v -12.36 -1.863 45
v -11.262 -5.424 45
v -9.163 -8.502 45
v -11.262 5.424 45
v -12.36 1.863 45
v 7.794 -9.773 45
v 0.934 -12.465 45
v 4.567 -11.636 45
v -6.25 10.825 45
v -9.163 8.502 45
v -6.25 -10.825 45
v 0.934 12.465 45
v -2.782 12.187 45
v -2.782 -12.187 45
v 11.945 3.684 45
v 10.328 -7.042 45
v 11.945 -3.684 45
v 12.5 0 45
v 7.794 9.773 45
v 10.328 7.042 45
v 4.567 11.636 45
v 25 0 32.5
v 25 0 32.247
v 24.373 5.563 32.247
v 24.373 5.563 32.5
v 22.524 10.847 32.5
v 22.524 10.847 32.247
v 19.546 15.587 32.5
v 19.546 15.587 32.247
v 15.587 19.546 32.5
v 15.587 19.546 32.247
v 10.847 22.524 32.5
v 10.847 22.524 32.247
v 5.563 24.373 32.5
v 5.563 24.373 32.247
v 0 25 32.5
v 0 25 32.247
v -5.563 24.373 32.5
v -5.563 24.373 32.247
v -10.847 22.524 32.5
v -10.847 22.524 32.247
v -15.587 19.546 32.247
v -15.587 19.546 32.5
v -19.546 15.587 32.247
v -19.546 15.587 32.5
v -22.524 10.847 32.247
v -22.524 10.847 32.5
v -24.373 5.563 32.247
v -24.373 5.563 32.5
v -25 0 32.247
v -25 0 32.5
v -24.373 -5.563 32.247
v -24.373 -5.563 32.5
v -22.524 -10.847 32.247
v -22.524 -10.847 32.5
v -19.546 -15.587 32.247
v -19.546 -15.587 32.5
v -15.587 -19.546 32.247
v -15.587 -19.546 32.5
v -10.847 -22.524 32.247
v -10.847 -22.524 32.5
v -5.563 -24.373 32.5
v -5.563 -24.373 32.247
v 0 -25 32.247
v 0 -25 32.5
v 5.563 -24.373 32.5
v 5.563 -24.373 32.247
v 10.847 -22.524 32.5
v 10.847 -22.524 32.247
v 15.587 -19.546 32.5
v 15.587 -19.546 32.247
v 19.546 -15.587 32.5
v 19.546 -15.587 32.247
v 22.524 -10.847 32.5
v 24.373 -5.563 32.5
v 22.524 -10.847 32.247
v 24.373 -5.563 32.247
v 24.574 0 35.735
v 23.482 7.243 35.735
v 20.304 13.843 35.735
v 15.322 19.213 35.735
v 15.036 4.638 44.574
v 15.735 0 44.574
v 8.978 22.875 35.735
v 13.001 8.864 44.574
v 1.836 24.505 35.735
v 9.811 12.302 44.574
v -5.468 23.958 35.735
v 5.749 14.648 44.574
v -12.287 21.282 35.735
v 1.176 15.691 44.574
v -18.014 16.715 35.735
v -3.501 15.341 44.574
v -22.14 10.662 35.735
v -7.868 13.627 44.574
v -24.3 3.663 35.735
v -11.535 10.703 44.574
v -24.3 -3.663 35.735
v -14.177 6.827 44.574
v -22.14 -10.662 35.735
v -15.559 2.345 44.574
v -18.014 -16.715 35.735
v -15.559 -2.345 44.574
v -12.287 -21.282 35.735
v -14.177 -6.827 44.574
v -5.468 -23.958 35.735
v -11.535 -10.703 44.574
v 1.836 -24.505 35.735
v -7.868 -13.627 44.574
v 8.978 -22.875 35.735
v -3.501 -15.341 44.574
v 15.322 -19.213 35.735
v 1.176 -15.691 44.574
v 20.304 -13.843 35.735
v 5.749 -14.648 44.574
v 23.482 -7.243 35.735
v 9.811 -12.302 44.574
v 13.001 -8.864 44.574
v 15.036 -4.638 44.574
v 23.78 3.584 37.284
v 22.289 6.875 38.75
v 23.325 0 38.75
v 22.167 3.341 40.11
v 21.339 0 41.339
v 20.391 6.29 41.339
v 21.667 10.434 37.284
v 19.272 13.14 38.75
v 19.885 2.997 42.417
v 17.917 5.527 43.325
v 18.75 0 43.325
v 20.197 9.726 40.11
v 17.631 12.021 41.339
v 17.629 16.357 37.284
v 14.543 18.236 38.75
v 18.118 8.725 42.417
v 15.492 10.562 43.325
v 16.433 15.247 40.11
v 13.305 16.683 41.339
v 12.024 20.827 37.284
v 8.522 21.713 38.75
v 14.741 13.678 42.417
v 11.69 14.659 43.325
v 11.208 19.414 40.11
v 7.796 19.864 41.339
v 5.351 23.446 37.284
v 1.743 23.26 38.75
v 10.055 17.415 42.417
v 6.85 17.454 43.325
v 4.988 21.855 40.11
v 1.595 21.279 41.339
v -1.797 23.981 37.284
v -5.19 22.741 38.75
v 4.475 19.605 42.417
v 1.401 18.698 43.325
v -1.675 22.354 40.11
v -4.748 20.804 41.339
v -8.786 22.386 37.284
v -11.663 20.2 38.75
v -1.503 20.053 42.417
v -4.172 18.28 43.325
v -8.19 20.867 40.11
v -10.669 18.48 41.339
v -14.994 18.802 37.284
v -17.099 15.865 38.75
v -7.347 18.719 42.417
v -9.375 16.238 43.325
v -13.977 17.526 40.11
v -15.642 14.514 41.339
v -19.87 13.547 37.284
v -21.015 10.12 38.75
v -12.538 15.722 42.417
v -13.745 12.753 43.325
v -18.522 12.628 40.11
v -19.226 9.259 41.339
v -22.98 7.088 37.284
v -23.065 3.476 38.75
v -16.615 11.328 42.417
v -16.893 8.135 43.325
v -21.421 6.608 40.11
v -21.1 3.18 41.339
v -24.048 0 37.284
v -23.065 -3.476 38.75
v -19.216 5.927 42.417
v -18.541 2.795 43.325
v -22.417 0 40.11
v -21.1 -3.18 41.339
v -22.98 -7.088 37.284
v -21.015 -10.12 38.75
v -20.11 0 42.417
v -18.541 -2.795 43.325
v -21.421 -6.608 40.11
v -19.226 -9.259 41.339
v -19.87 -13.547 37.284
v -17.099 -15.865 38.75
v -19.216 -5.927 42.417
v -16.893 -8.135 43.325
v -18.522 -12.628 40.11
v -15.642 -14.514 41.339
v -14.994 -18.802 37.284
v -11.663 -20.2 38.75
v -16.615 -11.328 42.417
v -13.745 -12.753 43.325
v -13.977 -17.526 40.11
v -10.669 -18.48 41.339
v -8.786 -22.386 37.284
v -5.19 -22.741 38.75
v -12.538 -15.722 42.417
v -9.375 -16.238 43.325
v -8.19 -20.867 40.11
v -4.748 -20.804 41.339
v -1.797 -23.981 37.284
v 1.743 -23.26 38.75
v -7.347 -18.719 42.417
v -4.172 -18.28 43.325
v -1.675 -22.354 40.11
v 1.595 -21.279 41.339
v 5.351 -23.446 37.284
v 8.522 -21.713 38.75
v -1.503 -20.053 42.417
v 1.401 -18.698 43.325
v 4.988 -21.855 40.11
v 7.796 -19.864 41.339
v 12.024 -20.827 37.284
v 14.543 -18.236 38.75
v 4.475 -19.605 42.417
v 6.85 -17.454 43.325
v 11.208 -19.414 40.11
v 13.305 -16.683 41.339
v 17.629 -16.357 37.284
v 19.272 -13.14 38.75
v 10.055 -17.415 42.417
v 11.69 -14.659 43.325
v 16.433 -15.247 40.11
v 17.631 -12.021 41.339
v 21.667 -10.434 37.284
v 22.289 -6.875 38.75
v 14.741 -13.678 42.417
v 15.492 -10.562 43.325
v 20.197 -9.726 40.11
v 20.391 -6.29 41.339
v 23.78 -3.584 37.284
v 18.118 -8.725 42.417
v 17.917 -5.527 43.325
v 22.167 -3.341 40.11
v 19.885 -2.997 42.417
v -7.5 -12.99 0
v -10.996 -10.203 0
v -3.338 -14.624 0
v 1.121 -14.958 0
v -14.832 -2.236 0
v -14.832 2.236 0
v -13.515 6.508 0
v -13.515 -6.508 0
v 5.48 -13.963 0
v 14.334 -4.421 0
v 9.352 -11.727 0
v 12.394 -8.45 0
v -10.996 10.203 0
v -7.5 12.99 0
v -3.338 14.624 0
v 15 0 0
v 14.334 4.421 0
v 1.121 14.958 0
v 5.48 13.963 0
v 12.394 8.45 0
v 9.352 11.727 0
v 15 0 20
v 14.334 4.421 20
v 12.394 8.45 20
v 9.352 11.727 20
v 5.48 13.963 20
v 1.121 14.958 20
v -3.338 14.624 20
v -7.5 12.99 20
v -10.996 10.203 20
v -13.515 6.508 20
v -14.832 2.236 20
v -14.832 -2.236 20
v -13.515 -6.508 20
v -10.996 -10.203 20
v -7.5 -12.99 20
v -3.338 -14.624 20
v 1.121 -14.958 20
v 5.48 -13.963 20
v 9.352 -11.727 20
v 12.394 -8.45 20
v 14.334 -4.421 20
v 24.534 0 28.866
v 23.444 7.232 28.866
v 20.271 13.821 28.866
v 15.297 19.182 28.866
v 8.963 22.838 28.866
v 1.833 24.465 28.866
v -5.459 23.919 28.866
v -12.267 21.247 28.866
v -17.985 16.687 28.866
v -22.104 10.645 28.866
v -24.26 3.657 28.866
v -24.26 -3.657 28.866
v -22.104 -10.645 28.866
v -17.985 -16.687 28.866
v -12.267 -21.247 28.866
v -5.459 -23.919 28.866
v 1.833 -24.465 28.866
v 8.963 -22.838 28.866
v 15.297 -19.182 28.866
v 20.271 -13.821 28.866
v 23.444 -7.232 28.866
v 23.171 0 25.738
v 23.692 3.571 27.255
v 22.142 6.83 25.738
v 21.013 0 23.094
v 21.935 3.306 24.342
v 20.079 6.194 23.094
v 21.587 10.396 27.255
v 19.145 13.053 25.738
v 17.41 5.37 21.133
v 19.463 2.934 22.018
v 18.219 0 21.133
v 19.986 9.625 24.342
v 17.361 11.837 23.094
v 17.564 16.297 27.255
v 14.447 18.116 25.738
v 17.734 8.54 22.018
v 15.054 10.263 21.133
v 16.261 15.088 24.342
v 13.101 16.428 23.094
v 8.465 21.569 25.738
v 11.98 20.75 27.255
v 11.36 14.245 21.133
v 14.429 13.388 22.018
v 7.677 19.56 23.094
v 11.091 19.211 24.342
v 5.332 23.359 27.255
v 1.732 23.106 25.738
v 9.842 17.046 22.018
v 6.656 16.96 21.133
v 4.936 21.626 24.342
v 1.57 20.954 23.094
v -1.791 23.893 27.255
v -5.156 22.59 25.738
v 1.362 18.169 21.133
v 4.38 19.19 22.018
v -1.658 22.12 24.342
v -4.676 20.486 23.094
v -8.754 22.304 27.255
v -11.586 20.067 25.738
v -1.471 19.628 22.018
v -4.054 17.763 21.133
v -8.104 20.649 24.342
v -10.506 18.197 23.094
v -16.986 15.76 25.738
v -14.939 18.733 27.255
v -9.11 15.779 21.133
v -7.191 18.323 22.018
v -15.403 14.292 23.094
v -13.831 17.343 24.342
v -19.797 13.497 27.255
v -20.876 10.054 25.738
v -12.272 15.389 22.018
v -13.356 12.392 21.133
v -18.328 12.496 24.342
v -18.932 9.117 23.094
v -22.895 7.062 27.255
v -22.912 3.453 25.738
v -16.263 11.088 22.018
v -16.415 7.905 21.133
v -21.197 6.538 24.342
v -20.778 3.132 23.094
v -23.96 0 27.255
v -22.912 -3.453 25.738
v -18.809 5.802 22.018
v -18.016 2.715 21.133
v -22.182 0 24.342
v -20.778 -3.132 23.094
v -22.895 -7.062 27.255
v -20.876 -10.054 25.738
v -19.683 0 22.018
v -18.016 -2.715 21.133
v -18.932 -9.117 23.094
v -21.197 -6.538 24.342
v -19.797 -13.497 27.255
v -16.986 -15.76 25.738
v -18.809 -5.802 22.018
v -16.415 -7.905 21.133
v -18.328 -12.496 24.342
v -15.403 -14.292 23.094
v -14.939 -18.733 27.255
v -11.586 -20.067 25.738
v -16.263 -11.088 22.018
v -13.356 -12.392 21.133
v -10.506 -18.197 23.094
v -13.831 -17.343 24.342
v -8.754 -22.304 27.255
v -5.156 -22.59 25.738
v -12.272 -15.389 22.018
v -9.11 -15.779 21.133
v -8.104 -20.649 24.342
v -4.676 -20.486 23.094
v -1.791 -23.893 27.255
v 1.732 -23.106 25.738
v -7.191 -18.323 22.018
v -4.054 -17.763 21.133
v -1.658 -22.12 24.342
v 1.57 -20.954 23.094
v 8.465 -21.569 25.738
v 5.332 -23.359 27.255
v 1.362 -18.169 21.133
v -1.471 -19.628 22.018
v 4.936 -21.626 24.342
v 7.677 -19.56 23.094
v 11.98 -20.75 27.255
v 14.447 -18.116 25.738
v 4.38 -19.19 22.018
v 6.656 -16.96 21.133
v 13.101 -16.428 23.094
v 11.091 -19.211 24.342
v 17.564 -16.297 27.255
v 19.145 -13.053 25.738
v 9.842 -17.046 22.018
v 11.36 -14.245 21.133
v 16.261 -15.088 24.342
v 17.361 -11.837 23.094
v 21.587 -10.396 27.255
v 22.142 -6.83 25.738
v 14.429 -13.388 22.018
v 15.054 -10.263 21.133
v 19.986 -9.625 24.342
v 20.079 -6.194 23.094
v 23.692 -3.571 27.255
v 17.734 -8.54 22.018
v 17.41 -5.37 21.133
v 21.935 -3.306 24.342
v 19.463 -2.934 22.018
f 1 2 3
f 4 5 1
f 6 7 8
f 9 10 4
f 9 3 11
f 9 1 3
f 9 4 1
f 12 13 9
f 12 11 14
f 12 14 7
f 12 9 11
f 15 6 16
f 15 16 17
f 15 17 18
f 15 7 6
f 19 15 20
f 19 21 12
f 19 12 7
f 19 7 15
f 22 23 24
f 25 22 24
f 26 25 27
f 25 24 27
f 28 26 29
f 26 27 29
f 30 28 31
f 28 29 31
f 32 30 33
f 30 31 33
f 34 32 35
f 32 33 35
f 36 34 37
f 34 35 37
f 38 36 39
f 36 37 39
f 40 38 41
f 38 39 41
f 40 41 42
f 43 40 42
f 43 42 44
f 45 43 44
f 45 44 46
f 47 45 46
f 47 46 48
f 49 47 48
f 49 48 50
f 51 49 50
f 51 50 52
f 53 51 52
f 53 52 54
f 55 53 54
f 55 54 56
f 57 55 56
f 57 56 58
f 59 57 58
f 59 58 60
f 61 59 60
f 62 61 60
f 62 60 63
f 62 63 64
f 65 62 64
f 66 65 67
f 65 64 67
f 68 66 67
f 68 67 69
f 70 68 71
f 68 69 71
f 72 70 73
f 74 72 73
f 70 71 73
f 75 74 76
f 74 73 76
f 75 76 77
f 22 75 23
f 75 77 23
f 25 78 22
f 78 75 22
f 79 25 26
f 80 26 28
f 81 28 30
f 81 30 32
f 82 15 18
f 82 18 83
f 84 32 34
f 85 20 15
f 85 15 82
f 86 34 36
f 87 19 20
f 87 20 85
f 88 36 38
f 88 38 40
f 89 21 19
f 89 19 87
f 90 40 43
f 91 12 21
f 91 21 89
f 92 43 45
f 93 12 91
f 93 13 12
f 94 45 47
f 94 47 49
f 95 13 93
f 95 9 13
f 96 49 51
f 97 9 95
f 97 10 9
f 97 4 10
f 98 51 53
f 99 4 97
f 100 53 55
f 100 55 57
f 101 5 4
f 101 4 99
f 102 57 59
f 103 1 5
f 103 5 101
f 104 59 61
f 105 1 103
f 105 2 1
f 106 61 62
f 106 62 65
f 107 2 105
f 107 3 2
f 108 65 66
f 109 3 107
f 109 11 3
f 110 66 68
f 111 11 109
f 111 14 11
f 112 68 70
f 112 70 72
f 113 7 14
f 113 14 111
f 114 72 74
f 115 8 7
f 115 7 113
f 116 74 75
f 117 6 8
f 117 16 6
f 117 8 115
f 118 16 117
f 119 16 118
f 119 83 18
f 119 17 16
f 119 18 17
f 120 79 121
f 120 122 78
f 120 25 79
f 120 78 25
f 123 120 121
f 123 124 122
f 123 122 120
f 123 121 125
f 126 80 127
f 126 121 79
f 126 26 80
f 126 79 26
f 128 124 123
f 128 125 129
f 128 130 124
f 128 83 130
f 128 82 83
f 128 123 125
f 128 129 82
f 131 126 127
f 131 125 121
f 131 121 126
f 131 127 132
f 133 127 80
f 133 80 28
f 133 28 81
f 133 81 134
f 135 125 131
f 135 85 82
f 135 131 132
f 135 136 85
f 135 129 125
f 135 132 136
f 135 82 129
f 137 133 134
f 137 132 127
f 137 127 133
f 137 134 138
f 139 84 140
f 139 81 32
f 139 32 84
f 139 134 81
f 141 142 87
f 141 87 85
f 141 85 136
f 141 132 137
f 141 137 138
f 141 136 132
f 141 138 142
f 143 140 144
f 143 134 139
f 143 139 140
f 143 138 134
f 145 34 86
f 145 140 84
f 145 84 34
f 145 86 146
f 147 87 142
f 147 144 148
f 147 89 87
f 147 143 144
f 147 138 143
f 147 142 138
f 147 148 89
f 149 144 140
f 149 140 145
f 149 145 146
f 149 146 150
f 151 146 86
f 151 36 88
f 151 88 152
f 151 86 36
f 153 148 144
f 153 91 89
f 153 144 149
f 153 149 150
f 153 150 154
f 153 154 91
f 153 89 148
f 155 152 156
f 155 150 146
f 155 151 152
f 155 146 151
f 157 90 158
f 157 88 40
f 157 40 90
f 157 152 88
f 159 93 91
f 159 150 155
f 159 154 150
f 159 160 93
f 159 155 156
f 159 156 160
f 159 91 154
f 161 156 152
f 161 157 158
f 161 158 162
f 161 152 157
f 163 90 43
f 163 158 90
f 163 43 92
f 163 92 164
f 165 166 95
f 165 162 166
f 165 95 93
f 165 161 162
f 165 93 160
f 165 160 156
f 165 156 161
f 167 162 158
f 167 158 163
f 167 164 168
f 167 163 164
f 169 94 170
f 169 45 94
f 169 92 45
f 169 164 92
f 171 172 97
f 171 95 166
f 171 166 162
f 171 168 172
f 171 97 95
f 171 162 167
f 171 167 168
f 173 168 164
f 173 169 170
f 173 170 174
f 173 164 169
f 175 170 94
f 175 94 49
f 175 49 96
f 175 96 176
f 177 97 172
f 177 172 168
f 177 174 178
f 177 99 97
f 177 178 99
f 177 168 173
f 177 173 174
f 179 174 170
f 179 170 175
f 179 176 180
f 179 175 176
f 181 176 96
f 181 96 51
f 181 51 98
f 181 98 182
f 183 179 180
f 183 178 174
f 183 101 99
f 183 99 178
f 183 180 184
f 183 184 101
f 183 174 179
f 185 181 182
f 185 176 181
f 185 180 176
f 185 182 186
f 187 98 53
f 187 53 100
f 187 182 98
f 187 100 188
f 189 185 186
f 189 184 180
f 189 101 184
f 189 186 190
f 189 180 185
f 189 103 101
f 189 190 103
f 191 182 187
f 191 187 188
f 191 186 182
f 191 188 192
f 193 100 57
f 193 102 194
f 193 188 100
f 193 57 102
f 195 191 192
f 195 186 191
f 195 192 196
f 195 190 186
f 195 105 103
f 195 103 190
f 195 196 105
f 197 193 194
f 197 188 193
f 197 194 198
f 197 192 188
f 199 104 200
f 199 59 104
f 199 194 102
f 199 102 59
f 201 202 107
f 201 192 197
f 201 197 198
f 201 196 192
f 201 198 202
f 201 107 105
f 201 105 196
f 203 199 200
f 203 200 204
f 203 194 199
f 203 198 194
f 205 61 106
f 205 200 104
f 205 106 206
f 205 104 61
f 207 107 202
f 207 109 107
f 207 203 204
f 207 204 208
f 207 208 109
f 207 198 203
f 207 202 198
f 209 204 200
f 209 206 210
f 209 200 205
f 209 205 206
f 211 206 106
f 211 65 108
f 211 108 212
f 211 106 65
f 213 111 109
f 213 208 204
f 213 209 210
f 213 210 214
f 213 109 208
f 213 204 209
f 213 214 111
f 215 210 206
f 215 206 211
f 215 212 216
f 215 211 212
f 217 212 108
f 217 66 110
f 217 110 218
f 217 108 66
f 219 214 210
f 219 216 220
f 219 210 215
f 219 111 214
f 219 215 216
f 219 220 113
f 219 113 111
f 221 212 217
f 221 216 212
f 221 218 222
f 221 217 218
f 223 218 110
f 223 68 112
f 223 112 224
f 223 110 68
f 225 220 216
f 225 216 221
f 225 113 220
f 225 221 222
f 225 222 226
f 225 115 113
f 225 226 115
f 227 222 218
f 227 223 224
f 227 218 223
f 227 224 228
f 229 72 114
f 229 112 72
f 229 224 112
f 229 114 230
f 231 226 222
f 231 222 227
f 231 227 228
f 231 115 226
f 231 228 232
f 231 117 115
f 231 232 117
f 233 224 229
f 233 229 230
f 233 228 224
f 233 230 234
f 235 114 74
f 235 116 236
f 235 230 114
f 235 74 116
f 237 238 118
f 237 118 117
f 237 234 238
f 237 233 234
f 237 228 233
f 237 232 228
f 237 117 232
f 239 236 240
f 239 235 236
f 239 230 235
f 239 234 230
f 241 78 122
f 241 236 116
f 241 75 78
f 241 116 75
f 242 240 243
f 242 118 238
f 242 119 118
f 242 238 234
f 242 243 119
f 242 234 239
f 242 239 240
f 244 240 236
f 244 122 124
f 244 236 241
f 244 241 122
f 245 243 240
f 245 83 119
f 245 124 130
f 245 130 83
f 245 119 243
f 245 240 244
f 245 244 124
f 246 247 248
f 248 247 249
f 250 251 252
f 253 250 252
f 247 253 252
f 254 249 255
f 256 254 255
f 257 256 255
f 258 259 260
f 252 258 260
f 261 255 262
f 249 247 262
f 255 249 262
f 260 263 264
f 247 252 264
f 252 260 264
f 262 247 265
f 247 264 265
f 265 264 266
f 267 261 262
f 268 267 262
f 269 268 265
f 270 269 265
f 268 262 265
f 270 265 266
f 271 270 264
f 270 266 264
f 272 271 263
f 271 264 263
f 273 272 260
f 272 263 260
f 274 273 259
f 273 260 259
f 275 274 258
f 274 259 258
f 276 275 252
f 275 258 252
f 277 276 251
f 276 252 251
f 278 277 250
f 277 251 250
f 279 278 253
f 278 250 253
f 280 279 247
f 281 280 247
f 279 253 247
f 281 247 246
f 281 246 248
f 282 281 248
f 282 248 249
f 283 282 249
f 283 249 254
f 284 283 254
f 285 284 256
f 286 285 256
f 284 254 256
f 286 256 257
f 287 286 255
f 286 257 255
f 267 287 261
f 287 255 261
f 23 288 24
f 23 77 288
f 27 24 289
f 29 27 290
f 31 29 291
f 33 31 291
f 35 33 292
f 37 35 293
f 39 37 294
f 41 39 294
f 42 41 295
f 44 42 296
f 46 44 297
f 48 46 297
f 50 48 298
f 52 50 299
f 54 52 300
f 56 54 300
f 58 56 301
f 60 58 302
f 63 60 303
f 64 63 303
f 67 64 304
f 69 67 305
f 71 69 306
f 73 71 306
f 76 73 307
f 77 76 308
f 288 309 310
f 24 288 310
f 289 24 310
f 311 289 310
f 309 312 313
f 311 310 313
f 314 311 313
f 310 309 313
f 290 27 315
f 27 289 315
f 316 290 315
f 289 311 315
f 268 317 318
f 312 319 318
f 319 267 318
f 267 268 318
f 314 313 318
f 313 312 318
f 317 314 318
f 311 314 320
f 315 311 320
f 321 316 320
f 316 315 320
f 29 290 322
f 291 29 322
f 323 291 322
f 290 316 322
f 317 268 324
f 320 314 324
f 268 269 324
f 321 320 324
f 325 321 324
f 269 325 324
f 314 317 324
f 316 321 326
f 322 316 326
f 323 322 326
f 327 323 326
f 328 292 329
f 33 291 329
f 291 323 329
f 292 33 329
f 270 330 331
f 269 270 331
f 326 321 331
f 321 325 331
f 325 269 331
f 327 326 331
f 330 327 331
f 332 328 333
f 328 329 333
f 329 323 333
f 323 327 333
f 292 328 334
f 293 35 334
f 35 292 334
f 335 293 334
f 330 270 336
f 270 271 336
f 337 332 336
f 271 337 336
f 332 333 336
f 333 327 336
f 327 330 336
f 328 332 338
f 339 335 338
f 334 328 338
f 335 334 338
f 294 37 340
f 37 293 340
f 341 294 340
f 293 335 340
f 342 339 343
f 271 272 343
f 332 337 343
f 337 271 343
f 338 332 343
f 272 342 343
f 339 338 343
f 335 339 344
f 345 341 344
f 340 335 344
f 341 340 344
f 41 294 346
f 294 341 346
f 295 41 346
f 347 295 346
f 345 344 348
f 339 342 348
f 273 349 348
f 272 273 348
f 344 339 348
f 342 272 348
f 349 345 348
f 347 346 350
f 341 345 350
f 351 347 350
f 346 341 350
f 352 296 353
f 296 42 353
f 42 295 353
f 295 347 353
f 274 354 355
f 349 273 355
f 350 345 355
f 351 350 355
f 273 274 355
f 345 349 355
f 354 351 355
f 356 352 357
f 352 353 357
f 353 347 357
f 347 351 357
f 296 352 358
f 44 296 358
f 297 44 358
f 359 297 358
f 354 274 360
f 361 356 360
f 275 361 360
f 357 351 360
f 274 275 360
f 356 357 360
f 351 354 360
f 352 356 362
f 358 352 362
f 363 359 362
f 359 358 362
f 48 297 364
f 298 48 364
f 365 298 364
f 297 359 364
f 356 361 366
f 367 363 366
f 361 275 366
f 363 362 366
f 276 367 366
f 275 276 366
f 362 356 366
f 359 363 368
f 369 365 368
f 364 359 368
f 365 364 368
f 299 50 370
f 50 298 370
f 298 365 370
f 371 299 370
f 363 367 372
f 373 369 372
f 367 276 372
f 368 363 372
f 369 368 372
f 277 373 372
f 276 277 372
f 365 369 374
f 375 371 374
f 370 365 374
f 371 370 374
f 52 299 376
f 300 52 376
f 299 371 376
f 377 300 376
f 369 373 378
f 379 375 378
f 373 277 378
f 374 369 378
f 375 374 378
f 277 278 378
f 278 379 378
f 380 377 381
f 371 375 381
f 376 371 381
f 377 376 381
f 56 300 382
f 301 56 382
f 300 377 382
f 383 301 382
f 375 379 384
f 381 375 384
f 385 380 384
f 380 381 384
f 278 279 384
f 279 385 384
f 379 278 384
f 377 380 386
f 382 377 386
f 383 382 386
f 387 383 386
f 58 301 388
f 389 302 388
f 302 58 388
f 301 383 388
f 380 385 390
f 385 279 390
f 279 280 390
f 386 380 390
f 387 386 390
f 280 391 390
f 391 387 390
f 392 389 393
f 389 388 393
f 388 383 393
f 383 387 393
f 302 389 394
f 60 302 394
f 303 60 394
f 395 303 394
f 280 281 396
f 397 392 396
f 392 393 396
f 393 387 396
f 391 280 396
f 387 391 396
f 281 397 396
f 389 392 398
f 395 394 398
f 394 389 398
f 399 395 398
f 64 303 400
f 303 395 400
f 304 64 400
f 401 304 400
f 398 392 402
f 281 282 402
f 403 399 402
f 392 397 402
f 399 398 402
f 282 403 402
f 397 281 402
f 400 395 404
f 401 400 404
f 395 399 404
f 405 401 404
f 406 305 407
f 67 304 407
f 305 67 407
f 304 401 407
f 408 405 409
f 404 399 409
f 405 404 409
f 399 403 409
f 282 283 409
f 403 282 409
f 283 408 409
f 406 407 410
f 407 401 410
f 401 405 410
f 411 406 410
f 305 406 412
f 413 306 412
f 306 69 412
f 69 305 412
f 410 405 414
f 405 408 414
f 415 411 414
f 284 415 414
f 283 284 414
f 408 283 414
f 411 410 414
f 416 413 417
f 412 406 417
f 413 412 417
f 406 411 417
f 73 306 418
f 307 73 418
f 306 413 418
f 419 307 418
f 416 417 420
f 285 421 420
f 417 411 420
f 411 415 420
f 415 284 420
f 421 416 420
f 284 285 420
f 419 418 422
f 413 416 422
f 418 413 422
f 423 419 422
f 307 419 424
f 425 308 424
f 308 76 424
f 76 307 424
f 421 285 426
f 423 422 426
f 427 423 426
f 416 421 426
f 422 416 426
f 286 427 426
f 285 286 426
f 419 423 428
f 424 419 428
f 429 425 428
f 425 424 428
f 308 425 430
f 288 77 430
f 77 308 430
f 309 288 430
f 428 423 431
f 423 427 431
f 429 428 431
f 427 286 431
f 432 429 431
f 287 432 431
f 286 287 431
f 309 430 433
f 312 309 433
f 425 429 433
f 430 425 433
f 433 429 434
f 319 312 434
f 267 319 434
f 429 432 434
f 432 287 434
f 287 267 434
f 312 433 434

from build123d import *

# Parameters (mm, degrees)
F0_R     = 15
F1_DEPTH = 20
F2_R     = 25
F3_DEPTH = 25


# Not quite as in the source:
# - a fillet or chamfer that OpenCascade refuses, or shapes differently, is made with other operations: its cross-section is extruded or revolved along the edge and cut away or added


with BuildPart() as f1:
    # F0 (on Top) → F1 (new body)
    with BuildSketch(Plane.XY):
        Circle(F0_R)
    extrude(amount=F1_DEPTH)

    # F2 (on face) → F3 (join)
    with BuildSketch(Plane.XY.offset(20)):
        Circle(F2_R)
    extrude(amount=F3_DEPTH)

    # F4: fillet of radius 12.5 on 2 edges, made by hand

    # F4_s1 → F4_t2 (revolve, cut)
    with BuildSketch(Plane.XZ):
        with BuildLine():
            ThreePointArc((25, 32.5), (21.3388347648, 41.3388347648), (12.5, 45))
            Line((12.5, 45), (25, 45))
            Line((25, 45), (25, 32.5))
        make_face()
    revolve(axis=Axis((0, 0, 45), (0, 0, 1)), mode=Mode.SUBTRACT)

    # F4_s3 → F4_t4 (revolve, cut)
    with BuildSketch(Plane.XZ):
        with BuildLine():
            ThreePointArc((25, 32.2474487139), (22.1824583655, 24.3417545635), (15, 20))
            Line((15, 20), (25, 20))
            Line((25, 20), (25, 32.2474487139))
        make_face()
    revolve(axis=Axis((0, 0, 20), (0, 0, 1)), mode=Mode.SUBTRACT)


solid = f1.part
